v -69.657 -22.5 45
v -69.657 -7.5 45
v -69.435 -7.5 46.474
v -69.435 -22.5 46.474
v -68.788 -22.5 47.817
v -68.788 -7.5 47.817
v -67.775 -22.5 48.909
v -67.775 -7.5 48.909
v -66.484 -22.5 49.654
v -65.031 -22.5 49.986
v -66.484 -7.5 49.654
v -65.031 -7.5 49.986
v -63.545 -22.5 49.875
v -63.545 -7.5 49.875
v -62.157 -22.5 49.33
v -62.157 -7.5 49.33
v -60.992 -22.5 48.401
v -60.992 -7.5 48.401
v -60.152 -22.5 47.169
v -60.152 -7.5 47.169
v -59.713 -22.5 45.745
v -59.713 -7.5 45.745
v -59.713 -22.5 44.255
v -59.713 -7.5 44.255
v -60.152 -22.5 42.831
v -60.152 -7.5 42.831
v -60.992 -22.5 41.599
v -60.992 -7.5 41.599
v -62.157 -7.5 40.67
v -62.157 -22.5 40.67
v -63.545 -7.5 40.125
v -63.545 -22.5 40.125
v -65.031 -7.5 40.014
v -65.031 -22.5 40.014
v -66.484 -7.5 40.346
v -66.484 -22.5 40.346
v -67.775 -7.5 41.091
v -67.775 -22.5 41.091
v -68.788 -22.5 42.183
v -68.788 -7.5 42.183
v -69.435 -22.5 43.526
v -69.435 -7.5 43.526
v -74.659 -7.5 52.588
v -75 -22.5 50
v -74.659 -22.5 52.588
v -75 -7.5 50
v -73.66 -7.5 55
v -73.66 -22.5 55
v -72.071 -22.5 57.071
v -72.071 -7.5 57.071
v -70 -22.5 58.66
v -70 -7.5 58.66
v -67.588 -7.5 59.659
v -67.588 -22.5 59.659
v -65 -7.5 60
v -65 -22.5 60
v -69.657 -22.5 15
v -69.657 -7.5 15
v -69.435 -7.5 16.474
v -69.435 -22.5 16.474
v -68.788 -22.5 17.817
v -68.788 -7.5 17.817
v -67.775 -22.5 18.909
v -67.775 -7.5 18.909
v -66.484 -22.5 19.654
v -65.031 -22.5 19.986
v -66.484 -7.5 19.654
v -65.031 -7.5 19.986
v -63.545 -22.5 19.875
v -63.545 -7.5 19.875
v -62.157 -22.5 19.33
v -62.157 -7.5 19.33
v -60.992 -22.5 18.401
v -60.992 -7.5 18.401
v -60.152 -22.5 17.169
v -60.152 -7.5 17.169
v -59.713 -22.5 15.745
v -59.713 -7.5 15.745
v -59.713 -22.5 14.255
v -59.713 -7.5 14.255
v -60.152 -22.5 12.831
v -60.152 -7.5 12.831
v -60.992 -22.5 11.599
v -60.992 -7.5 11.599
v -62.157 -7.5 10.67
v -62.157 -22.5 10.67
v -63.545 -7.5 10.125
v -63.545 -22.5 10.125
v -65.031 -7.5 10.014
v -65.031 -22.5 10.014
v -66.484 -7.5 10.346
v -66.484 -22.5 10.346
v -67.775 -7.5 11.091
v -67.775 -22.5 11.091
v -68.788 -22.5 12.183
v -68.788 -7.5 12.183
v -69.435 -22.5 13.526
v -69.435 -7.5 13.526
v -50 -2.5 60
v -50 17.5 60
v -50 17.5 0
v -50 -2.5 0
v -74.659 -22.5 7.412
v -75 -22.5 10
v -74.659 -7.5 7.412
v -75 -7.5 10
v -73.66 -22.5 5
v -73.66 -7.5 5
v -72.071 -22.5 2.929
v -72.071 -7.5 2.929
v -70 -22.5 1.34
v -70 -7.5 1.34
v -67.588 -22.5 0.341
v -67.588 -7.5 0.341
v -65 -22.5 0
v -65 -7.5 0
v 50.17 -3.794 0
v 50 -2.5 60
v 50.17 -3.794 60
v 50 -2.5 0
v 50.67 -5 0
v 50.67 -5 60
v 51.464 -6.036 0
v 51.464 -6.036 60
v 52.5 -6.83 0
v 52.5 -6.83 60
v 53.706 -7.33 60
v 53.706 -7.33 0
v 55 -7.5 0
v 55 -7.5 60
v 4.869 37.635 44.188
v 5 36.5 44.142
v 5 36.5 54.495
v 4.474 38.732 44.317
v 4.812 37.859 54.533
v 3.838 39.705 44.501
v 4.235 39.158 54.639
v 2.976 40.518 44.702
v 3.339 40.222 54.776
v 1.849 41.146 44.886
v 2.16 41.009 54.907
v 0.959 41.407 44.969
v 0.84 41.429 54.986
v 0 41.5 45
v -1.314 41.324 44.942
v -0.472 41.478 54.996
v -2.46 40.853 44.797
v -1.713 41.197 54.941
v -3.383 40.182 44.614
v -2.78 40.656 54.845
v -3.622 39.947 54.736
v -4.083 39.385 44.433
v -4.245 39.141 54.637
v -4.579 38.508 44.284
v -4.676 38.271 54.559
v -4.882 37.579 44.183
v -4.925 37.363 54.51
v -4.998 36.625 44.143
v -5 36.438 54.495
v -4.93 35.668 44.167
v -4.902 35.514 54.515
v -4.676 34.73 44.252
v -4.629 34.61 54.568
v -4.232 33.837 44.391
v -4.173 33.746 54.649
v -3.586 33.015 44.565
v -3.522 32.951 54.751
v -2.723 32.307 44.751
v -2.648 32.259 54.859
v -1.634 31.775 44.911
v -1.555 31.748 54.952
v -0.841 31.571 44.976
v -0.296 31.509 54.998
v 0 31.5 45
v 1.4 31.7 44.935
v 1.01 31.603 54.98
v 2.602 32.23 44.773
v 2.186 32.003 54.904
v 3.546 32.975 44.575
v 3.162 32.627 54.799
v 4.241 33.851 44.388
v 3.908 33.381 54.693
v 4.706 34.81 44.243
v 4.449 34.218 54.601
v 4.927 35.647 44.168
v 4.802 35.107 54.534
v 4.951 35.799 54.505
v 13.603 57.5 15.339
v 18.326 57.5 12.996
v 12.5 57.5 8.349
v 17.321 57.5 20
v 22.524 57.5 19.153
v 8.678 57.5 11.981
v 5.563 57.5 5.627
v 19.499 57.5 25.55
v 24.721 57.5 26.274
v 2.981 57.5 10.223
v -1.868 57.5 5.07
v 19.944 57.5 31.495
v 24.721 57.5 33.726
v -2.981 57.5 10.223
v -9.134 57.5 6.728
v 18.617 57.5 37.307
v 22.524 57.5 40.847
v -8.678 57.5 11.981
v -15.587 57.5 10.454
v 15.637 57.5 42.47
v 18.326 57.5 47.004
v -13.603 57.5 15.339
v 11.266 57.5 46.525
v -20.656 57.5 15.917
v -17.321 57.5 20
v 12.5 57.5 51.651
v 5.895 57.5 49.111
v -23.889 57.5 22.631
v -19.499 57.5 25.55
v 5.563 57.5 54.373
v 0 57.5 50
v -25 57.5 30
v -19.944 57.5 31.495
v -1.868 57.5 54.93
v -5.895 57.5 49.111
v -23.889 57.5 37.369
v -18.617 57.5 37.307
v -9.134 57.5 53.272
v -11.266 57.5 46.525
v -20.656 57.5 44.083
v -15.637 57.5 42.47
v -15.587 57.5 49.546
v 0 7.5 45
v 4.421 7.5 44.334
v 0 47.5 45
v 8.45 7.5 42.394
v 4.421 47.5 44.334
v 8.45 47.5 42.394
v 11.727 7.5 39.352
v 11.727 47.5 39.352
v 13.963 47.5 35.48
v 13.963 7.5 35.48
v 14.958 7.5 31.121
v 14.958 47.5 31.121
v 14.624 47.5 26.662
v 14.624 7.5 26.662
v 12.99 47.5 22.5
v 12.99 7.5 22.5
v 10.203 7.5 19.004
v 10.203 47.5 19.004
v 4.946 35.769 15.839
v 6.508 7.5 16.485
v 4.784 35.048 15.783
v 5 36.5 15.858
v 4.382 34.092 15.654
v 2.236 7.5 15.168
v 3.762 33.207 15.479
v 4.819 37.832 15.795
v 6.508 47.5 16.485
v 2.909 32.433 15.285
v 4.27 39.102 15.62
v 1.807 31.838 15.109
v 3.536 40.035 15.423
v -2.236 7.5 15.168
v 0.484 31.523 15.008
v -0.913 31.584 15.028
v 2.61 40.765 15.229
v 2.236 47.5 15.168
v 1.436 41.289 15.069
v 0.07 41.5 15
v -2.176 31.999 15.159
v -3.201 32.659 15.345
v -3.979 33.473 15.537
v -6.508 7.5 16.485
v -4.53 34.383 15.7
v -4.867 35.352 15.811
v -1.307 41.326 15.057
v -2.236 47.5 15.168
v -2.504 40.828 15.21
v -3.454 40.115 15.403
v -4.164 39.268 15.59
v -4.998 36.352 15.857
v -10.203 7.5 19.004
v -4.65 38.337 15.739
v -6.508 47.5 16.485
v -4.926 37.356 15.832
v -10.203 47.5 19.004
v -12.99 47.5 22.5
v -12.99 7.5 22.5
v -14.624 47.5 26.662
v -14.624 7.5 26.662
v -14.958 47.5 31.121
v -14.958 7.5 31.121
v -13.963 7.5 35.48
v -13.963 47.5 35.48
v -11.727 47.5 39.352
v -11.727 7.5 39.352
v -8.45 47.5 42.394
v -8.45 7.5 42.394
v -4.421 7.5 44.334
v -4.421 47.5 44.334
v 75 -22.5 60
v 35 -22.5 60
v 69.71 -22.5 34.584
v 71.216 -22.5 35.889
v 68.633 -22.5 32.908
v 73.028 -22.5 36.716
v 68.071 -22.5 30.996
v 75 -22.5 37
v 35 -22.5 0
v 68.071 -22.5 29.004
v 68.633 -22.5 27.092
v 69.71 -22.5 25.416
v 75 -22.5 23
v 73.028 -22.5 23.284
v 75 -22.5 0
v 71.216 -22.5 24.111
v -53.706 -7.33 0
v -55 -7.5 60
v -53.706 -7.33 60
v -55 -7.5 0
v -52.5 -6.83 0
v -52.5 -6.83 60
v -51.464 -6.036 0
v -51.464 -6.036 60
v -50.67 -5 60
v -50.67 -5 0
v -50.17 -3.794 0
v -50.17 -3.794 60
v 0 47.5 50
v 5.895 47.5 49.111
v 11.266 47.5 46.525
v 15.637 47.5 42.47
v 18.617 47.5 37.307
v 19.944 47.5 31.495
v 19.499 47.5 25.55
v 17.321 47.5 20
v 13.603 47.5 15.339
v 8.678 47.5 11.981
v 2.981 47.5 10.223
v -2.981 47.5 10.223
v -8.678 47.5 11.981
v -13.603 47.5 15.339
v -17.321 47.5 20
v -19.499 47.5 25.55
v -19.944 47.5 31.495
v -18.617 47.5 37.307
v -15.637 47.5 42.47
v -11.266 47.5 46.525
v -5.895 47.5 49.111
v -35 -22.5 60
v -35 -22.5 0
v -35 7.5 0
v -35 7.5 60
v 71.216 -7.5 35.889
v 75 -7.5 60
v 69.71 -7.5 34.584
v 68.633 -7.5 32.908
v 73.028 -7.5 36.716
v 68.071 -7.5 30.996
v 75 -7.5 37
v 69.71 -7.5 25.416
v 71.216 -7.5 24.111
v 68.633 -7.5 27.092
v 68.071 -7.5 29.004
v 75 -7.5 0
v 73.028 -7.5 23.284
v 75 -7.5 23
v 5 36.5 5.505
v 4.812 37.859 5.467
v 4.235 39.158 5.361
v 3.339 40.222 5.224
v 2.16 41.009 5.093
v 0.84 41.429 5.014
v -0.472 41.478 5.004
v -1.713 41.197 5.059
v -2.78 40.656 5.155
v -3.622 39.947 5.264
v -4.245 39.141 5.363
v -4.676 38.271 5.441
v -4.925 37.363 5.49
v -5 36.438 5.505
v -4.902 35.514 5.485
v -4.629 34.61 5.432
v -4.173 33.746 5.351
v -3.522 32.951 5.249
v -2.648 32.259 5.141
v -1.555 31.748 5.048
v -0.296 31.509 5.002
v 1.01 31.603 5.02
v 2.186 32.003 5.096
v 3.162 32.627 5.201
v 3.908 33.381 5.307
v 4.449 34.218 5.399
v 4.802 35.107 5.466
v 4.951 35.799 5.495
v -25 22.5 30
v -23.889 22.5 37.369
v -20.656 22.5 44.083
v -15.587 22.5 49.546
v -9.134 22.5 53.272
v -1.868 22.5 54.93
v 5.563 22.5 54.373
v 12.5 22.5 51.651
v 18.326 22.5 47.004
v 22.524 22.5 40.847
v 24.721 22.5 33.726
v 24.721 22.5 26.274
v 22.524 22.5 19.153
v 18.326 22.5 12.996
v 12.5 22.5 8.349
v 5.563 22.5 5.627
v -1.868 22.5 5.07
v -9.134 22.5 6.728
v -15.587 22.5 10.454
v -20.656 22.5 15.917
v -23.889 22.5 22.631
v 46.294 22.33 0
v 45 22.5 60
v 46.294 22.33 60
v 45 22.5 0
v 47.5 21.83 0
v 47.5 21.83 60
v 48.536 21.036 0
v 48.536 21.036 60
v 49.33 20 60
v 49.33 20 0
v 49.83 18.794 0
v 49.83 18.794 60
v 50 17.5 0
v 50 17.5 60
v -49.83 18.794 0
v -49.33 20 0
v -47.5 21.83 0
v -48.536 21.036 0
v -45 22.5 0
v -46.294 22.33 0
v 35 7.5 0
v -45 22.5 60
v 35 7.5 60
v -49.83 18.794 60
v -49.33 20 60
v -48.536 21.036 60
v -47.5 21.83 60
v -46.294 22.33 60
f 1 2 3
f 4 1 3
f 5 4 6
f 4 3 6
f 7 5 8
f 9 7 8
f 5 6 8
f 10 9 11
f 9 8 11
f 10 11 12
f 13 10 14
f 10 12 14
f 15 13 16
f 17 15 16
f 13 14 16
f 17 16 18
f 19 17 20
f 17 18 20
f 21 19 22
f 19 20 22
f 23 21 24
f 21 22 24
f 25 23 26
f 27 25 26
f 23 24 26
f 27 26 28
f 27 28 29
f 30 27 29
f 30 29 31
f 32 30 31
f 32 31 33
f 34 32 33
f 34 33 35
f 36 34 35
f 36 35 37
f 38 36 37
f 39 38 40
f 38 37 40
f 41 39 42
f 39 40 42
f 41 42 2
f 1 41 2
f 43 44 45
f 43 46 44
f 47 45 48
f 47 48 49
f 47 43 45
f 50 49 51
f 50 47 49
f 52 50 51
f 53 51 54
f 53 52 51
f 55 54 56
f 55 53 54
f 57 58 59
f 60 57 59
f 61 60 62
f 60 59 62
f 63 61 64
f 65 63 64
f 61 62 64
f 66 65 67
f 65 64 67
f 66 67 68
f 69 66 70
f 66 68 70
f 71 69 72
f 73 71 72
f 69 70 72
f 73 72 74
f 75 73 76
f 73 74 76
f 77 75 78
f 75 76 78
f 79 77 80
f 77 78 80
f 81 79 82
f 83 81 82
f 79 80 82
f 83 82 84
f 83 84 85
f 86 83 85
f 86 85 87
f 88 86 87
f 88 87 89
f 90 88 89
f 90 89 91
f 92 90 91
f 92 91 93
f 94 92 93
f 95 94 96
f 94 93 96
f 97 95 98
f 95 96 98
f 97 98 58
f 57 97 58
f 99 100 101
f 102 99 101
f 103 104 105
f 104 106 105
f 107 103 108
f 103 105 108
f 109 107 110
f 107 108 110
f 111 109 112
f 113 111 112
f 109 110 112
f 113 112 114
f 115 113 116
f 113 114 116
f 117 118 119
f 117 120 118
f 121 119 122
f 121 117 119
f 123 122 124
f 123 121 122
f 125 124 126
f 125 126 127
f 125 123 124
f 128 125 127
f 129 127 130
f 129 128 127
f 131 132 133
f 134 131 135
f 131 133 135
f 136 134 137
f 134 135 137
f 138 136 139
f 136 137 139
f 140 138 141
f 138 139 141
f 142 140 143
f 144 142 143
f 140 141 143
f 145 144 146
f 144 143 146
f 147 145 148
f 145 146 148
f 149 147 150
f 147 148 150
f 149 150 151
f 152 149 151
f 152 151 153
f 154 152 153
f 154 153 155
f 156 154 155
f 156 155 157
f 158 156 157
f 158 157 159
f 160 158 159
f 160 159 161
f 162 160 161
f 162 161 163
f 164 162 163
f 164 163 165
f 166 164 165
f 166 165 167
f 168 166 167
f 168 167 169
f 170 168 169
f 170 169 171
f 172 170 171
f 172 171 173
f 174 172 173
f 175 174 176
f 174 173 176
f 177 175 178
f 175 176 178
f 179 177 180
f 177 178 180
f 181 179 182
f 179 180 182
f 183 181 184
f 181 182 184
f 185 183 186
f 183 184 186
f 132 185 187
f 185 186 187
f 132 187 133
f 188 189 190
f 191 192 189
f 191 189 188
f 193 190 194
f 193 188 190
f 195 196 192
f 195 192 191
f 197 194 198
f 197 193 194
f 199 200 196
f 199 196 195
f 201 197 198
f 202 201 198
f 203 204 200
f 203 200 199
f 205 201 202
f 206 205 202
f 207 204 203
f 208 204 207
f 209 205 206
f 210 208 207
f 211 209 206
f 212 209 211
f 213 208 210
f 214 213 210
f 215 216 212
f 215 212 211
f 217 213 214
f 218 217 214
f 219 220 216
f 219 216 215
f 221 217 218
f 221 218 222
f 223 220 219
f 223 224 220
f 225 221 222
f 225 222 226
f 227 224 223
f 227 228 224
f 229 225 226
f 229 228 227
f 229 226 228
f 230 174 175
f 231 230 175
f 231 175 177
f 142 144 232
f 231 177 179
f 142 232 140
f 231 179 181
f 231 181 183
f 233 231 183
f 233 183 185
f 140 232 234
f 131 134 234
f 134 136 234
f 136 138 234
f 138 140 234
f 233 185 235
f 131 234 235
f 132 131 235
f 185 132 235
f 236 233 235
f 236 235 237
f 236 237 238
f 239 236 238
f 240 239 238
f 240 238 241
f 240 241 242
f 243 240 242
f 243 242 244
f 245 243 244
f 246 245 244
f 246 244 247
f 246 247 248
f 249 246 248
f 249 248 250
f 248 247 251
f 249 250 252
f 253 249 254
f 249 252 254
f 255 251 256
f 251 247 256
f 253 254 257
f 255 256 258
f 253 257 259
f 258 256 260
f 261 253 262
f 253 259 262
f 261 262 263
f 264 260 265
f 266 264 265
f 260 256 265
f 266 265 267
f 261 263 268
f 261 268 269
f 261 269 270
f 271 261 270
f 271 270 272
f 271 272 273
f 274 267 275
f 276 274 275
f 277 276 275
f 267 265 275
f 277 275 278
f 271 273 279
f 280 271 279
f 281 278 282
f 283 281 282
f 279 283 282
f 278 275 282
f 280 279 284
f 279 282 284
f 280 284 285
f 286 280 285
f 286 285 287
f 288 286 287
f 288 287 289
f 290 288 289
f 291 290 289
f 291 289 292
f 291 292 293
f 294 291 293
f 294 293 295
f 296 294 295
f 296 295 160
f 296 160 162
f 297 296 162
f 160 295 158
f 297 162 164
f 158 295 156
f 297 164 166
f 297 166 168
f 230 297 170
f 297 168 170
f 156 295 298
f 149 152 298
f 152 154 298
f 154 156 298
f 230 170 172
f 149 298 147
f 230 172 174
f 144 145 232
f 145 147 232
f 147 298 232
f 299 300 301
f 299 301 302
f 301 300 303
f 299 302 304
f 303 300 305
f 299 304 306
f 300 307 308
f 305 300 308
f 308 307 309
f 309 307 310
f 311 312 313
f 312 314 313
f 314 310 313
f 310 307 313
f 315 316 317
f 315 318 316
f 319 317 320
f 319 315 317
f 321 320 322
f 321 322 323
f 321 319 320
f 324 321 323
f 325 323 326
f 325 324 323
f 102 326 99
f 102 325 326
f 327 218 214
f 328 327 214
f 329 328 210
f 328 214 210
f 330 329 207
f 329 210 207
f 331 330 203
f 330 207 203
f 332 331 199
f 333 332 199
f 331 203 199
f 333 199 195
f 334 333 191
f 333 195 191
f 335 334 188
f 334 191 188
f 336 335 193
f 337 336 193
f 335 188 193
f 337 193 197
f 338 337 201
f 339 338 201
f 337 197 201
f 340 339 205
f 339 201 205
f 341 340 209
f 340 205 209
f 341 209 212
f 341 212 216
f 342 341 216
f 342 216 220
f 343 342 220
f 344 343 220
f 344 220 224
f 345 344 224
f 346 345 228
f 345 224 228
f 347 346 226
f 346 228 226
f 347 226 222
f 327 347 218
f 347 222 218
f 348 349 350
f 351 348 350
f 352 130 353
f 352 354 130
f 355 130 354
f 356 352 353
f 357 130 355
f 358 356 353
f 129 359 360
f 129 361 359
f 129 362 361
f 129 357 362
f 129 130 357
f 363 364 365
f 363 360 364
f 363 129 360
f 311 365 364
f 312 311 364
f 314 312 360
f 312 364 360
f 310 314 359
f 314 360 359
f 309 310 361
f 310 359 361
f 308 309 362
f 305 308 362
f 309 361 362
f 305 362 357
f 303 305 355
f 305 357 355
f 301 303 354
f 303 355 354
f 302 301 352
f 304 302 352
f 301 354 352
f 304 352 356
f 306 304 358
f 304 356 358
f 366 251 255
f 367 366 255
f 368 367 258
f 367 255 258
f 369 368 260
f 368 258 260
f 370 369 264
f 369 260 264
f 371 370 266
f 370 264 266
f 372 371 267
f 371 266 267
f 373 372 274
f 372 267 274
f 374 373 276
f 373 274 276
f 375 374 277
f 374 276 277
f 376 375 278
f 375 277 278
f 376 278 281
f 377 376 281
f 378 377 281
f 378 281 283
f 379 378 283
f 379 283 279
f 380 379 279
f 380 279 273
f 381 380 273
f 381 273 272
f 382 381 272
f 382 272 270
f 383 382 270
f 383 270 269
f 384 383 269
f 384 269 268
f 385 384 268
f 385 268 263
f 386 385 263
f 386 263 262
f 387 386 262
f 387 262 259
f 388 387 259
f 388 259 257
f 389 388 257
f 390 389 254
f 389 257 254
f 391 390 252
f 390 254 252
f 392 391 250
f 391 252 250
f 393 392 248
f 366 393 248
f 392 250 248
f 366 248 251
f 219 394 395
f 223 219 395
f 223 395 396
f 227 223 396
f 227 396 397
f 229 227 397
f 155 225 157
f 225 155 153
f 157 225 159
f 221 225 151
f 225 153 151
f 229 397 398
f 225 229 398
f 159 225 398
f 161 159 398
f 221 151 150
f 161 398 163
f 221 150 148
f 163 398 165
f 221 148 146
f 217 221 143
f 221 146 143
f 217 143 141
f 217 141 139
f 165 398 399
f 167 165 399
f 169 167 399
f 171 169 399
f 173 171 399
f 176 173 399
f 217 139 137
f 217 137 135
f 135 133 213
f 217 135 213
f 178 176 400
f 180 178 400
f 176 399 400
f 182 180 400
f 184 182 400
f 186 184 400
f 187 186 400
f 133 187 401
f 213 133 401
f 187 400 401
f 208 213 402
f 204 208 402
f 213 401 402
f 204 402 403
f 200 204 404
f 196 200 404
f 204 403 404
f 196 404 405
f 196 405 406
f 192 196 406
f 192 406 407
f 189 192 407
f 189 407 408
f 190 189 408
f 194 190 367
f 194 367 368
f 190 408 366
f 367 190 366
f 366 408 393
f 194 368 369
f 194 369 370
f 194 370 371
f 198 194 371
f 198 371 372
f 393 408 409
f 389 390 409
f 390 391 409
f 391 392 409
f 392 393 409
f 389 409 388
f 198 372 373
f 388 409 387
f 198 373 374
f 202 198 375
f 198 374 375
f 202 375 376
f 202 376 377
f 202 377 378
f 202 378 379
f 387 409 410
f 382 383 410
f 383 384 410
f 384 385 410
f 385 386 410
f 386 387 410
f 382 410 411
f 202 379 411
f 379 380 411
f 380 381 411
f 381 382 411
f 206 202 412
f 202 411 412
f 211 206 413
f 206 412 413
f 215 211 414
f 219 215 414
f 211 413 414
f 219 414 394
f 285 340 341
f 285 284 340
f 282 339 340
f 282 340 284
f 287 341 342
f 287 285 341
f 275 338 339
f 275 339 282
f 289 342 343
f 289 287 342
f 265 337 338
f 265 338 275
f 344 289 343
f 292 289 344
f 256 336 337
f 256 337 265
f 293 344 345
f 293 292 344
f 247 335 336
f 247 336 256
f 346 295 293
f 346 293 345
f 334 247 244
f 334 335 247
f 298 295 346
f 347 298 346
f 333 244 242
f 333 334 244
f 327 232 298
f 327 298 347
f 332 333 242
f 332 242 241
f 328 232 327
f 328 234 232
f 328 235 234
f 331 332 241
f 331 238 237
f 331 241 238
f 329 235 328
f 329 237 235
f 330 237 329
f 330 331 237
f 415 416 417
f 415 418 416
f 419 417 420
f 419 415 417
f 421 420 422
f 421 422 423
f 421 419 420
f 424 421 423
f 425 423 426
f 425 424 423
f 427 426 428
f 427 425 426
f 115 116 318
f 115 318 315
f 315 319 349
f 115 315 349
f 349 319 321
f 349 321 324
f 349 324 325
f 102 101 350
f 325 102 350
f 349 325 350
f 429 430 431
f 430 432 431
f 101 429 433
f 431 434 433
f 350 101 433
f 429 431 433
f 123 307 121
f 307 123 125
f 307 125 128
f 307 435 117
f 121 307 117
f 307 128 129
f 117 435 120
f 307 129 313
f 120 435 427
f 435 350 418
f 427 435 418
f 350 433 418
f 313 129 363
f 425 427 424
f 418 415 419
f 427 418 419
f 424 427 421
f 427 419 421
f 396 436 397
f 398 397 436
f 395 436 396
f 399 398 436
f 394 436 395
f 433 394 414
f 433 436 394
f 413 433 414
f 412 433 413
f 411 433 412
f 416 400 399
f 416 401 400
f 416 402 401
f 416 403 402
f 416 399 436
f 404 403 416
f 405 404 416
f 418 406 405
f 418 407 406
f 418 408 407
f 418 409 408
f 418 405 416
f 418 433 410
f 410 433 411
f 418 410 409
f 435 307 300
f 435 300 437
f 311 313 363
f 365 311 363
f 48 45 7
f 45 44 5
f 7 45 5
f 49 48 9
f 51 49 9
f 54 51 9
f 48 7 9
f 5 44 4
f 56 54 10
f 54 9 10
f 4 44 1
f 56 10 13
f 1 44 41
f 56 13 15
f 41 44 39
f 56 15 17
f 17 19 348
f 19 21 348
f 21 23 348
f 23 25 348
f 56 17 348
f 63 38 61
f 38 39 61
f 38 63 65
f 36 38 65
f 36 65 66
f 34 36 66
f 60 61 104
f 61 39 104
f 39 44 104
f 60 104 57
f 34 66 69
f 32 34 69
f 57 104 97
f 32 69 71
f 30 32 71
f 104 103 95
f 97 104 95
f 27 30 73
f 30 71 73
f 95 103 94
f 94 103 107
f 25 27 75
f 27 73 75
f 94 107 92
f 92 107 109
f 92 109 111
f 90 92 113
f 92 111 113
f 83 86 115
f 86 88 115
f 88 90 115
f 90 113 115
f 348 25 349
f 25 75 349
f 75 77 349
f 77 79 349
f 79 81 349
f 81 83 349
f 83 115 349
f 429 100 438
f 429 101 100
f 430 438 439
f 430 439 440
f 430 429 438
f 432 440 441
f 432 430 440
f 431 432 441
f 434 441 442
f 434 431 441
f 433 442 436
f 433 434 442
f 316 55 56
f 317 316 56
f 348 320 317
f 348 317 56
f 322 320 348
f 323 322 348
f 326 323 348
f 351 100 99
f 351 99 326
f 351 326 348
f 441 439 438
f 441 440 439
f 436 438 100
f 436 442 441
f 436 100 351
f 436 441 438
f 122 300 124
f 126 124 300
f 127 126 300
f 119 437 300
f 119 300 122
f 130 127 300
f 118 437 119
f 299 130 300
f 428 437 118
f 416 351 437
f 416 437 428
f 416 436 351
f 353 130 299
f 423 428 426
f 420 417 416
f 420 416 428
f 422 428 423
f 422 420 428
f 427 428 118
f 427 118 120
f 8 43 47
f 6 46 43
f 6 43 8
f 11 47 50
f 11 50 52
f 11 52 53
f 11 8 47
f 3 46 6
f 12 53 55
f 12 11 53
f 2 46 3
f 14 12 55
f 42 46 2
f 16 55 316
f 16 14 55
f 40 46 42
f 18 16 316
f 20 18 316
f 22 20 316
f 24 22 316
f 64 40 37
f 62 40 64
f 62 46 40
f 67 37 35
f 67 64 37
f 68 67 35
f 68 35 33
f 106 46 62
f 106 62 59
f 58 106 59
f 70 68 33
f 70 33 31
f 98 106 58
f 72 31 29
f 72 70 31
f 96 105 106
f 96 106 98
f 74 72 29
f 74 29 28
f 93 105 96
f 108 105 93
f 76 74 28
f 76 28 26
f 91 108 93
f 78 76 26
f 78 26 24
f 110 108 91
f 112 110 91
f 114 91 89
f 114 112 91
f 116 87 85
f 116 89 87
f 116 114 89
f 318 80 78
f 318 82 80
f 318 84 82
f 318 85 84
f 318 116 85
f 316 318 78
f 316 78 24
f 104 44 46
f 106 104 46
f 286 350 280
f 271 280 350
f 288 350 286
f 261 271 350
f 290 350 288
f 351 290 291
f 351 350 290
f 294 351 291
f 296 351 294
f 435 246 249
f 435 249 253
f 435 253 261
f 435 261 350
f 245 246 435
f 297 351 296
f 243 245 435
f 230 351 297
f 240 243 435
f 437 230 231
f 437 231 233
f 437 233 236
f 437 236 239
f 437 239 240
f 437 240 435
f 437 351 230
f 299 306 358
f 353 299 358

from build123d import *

# Parameters (mm, degrees)
SKETCH1_W           = 150
SKETCH1_H           = 45
BOSS_EXTRUDE1_DEPTH = 60
SKETCH2_W           = 70
SKETCH2_H           = 30
CUT_EXTRUDE1_DEPTH  = 60
SKETCH8_W           = 25
SKETCH8_H           = 60
CUT_EXTRUDE5_DEPTH  = 30
SKETCH9_R           = 25
BOSS_EXTRUDE4_DEPTH = 35
SKETCH10_R          = 20
SKETCH10_R_2        = 15
CUT_EXTRUDE7_DEPTH  = 10
SKETCH10_5_R        = 15
CUT_EXTRUDE8_DEPTH  = 70
SKETCH12_R          = 5
CUT_EXTRUDE9_DEPTH  = 70
FILLET1_R           = 10
SKETCH13_R          = 7
CUT_EXTRUDE10_DEPTH = 15
SKETCH14_R          = 5
CUT_EXTRUDE11_DEPTH = 15
FILLET2_R           = 5


with BuildPart() as part:
    # Sketch1 → Boss-Extrude1 (new body)
    with BuildSketch(Plane.XY):
        Rectangle(SKETCH1_W, SKETCH1_H)
    extrude(amount=BOSS_EXTRUDE1_DEPTH)

    # Sketch2 → Cut-Extrude1 (cut)
    with BuildSketch(Plane.XY.offset(60)):
        with Locations((0, -7.5)):
            Rectangle(SKETCH2_W, SKETCH2_H)
    extrude(amount=-CUT_EXTRUDE1_DEPTH, mode=Mode.SUBTRACT)

    # Sketch8 → Cut-Extrude5 (cut)
    with BuildSketch(Plane(origin=(0, 22.5, 0), x_dir=(1, 0, 0), z_dir=(0, 1, 0))):
        with Locations((-62.5, -30)):
            Rectangle(SKETCH8_W, SKETCH8_H)
        with Locations((62.5, -30)):
            Rectangle(SKETCH8_W, SKETCH8_H)
    extrude(amount=-CUT_EXTRUDE5_DEPTH, mode=Mode.SUBTRACT)

    # Sketch9 → Boss-Extrude4 (add)
    with BuildSketch(Plane(origin=(0, 22.5, 0), x_dir=(1, 0, 0), z_dir=(0, 1, 0))):
        with Locations((0, -30)):
            Circle(SKETCH9_R)
    extrude(amount=BOSS_EXTRUDE4_DEPTH)

    # Sketch10 → Cut-Extrude7 (cut)
    with BuildSketch(Plane(origin=(0, 57.5, 0), x_dir=(1, 0, 0), z_dir=(0, 1, 0))):
        with Locations((0, -30)):
            Circle(SKETCH10_R)
        with Locations((0, -30)):
            Circle(SKETCH10_R_2, mode=Mode.SUBTRACT)
    extrude(amount=-CUT_EXTRUDE7_DEPTH, mode=Mode.SUBTRACT)

    # Sketch10<5> → Cut-Extrude8 (cut)
    with BuildSketch(Plane(origin=(0, 57.5, 0), x_dir=(1, 0, 0), z_dir=(0, 1, 0))):
        with Locations((0, -30)):
            Circle(SKETCH10_5_R)
    extrude(amount=-CUT_EXTRUDE8_DEPTH, mode=Mode.SUBTRACT)

    # Sketch12 → Cut-Extrude9 (cut)
    with BuildSketch(Plane.XY.offset(60)):
        with Locations((0, 36.5)):
            Circle(SKETCH12_R)
    extrude(amount=-CUT_EXTRUDE9_DEPTH, mode=Mode.SUBTRACT)

    # Fillet1
    fillet1_edges = [part.edges().sort_by_distance(p)[0] for p in [
        (-75, -15, 60),
        (-75, -15, 0),
    ]]
    fillet(fillet1_edges, radius=FILLET1_R)

    # Sketch13 → Cut-Extrude10 (cut)
    with BuildSketch(Plane(origin=(0, -7.5, 0), x_dir=(1, 0, 0), z_dir=(0, 1, 0))):
        with Locations((75, -30)):
            Circle(SKETCH13_R)
    extrude(amount=-CUT_EXTRUDE10_DEPTH, mode=Mode.SUBTRACT)

    # Sketch14 → Cut-Extrude11 (cut)
    with BuildSketch(Plane(origin=(0, -7.5, 0), x_dir=(1, 0, 0), z_dir=(0, 1, 0))):
        with Locations((-64.657240853, -15)):
            Circle(SKETCH14_R)
        with Locations((-64.657240853, -45)):
            Circle(SKETCH14_R)
    extrude(amount=-CUT_EXTRUDE11_DEPTH, mode=Mode.SUBTRACT)

    # Fillet2
    fillet2_edges = [part.edges().sort_by_distance(p)[0] for p in [
        (-50, -7.5, 30),
        (50, -7.5, 30),
        (50, 22.5, 30),
        (-50, 22.5, 30),
    ]]
    fillet(fillet2_edges, radius=FILLET2_R)


solid = part.part
